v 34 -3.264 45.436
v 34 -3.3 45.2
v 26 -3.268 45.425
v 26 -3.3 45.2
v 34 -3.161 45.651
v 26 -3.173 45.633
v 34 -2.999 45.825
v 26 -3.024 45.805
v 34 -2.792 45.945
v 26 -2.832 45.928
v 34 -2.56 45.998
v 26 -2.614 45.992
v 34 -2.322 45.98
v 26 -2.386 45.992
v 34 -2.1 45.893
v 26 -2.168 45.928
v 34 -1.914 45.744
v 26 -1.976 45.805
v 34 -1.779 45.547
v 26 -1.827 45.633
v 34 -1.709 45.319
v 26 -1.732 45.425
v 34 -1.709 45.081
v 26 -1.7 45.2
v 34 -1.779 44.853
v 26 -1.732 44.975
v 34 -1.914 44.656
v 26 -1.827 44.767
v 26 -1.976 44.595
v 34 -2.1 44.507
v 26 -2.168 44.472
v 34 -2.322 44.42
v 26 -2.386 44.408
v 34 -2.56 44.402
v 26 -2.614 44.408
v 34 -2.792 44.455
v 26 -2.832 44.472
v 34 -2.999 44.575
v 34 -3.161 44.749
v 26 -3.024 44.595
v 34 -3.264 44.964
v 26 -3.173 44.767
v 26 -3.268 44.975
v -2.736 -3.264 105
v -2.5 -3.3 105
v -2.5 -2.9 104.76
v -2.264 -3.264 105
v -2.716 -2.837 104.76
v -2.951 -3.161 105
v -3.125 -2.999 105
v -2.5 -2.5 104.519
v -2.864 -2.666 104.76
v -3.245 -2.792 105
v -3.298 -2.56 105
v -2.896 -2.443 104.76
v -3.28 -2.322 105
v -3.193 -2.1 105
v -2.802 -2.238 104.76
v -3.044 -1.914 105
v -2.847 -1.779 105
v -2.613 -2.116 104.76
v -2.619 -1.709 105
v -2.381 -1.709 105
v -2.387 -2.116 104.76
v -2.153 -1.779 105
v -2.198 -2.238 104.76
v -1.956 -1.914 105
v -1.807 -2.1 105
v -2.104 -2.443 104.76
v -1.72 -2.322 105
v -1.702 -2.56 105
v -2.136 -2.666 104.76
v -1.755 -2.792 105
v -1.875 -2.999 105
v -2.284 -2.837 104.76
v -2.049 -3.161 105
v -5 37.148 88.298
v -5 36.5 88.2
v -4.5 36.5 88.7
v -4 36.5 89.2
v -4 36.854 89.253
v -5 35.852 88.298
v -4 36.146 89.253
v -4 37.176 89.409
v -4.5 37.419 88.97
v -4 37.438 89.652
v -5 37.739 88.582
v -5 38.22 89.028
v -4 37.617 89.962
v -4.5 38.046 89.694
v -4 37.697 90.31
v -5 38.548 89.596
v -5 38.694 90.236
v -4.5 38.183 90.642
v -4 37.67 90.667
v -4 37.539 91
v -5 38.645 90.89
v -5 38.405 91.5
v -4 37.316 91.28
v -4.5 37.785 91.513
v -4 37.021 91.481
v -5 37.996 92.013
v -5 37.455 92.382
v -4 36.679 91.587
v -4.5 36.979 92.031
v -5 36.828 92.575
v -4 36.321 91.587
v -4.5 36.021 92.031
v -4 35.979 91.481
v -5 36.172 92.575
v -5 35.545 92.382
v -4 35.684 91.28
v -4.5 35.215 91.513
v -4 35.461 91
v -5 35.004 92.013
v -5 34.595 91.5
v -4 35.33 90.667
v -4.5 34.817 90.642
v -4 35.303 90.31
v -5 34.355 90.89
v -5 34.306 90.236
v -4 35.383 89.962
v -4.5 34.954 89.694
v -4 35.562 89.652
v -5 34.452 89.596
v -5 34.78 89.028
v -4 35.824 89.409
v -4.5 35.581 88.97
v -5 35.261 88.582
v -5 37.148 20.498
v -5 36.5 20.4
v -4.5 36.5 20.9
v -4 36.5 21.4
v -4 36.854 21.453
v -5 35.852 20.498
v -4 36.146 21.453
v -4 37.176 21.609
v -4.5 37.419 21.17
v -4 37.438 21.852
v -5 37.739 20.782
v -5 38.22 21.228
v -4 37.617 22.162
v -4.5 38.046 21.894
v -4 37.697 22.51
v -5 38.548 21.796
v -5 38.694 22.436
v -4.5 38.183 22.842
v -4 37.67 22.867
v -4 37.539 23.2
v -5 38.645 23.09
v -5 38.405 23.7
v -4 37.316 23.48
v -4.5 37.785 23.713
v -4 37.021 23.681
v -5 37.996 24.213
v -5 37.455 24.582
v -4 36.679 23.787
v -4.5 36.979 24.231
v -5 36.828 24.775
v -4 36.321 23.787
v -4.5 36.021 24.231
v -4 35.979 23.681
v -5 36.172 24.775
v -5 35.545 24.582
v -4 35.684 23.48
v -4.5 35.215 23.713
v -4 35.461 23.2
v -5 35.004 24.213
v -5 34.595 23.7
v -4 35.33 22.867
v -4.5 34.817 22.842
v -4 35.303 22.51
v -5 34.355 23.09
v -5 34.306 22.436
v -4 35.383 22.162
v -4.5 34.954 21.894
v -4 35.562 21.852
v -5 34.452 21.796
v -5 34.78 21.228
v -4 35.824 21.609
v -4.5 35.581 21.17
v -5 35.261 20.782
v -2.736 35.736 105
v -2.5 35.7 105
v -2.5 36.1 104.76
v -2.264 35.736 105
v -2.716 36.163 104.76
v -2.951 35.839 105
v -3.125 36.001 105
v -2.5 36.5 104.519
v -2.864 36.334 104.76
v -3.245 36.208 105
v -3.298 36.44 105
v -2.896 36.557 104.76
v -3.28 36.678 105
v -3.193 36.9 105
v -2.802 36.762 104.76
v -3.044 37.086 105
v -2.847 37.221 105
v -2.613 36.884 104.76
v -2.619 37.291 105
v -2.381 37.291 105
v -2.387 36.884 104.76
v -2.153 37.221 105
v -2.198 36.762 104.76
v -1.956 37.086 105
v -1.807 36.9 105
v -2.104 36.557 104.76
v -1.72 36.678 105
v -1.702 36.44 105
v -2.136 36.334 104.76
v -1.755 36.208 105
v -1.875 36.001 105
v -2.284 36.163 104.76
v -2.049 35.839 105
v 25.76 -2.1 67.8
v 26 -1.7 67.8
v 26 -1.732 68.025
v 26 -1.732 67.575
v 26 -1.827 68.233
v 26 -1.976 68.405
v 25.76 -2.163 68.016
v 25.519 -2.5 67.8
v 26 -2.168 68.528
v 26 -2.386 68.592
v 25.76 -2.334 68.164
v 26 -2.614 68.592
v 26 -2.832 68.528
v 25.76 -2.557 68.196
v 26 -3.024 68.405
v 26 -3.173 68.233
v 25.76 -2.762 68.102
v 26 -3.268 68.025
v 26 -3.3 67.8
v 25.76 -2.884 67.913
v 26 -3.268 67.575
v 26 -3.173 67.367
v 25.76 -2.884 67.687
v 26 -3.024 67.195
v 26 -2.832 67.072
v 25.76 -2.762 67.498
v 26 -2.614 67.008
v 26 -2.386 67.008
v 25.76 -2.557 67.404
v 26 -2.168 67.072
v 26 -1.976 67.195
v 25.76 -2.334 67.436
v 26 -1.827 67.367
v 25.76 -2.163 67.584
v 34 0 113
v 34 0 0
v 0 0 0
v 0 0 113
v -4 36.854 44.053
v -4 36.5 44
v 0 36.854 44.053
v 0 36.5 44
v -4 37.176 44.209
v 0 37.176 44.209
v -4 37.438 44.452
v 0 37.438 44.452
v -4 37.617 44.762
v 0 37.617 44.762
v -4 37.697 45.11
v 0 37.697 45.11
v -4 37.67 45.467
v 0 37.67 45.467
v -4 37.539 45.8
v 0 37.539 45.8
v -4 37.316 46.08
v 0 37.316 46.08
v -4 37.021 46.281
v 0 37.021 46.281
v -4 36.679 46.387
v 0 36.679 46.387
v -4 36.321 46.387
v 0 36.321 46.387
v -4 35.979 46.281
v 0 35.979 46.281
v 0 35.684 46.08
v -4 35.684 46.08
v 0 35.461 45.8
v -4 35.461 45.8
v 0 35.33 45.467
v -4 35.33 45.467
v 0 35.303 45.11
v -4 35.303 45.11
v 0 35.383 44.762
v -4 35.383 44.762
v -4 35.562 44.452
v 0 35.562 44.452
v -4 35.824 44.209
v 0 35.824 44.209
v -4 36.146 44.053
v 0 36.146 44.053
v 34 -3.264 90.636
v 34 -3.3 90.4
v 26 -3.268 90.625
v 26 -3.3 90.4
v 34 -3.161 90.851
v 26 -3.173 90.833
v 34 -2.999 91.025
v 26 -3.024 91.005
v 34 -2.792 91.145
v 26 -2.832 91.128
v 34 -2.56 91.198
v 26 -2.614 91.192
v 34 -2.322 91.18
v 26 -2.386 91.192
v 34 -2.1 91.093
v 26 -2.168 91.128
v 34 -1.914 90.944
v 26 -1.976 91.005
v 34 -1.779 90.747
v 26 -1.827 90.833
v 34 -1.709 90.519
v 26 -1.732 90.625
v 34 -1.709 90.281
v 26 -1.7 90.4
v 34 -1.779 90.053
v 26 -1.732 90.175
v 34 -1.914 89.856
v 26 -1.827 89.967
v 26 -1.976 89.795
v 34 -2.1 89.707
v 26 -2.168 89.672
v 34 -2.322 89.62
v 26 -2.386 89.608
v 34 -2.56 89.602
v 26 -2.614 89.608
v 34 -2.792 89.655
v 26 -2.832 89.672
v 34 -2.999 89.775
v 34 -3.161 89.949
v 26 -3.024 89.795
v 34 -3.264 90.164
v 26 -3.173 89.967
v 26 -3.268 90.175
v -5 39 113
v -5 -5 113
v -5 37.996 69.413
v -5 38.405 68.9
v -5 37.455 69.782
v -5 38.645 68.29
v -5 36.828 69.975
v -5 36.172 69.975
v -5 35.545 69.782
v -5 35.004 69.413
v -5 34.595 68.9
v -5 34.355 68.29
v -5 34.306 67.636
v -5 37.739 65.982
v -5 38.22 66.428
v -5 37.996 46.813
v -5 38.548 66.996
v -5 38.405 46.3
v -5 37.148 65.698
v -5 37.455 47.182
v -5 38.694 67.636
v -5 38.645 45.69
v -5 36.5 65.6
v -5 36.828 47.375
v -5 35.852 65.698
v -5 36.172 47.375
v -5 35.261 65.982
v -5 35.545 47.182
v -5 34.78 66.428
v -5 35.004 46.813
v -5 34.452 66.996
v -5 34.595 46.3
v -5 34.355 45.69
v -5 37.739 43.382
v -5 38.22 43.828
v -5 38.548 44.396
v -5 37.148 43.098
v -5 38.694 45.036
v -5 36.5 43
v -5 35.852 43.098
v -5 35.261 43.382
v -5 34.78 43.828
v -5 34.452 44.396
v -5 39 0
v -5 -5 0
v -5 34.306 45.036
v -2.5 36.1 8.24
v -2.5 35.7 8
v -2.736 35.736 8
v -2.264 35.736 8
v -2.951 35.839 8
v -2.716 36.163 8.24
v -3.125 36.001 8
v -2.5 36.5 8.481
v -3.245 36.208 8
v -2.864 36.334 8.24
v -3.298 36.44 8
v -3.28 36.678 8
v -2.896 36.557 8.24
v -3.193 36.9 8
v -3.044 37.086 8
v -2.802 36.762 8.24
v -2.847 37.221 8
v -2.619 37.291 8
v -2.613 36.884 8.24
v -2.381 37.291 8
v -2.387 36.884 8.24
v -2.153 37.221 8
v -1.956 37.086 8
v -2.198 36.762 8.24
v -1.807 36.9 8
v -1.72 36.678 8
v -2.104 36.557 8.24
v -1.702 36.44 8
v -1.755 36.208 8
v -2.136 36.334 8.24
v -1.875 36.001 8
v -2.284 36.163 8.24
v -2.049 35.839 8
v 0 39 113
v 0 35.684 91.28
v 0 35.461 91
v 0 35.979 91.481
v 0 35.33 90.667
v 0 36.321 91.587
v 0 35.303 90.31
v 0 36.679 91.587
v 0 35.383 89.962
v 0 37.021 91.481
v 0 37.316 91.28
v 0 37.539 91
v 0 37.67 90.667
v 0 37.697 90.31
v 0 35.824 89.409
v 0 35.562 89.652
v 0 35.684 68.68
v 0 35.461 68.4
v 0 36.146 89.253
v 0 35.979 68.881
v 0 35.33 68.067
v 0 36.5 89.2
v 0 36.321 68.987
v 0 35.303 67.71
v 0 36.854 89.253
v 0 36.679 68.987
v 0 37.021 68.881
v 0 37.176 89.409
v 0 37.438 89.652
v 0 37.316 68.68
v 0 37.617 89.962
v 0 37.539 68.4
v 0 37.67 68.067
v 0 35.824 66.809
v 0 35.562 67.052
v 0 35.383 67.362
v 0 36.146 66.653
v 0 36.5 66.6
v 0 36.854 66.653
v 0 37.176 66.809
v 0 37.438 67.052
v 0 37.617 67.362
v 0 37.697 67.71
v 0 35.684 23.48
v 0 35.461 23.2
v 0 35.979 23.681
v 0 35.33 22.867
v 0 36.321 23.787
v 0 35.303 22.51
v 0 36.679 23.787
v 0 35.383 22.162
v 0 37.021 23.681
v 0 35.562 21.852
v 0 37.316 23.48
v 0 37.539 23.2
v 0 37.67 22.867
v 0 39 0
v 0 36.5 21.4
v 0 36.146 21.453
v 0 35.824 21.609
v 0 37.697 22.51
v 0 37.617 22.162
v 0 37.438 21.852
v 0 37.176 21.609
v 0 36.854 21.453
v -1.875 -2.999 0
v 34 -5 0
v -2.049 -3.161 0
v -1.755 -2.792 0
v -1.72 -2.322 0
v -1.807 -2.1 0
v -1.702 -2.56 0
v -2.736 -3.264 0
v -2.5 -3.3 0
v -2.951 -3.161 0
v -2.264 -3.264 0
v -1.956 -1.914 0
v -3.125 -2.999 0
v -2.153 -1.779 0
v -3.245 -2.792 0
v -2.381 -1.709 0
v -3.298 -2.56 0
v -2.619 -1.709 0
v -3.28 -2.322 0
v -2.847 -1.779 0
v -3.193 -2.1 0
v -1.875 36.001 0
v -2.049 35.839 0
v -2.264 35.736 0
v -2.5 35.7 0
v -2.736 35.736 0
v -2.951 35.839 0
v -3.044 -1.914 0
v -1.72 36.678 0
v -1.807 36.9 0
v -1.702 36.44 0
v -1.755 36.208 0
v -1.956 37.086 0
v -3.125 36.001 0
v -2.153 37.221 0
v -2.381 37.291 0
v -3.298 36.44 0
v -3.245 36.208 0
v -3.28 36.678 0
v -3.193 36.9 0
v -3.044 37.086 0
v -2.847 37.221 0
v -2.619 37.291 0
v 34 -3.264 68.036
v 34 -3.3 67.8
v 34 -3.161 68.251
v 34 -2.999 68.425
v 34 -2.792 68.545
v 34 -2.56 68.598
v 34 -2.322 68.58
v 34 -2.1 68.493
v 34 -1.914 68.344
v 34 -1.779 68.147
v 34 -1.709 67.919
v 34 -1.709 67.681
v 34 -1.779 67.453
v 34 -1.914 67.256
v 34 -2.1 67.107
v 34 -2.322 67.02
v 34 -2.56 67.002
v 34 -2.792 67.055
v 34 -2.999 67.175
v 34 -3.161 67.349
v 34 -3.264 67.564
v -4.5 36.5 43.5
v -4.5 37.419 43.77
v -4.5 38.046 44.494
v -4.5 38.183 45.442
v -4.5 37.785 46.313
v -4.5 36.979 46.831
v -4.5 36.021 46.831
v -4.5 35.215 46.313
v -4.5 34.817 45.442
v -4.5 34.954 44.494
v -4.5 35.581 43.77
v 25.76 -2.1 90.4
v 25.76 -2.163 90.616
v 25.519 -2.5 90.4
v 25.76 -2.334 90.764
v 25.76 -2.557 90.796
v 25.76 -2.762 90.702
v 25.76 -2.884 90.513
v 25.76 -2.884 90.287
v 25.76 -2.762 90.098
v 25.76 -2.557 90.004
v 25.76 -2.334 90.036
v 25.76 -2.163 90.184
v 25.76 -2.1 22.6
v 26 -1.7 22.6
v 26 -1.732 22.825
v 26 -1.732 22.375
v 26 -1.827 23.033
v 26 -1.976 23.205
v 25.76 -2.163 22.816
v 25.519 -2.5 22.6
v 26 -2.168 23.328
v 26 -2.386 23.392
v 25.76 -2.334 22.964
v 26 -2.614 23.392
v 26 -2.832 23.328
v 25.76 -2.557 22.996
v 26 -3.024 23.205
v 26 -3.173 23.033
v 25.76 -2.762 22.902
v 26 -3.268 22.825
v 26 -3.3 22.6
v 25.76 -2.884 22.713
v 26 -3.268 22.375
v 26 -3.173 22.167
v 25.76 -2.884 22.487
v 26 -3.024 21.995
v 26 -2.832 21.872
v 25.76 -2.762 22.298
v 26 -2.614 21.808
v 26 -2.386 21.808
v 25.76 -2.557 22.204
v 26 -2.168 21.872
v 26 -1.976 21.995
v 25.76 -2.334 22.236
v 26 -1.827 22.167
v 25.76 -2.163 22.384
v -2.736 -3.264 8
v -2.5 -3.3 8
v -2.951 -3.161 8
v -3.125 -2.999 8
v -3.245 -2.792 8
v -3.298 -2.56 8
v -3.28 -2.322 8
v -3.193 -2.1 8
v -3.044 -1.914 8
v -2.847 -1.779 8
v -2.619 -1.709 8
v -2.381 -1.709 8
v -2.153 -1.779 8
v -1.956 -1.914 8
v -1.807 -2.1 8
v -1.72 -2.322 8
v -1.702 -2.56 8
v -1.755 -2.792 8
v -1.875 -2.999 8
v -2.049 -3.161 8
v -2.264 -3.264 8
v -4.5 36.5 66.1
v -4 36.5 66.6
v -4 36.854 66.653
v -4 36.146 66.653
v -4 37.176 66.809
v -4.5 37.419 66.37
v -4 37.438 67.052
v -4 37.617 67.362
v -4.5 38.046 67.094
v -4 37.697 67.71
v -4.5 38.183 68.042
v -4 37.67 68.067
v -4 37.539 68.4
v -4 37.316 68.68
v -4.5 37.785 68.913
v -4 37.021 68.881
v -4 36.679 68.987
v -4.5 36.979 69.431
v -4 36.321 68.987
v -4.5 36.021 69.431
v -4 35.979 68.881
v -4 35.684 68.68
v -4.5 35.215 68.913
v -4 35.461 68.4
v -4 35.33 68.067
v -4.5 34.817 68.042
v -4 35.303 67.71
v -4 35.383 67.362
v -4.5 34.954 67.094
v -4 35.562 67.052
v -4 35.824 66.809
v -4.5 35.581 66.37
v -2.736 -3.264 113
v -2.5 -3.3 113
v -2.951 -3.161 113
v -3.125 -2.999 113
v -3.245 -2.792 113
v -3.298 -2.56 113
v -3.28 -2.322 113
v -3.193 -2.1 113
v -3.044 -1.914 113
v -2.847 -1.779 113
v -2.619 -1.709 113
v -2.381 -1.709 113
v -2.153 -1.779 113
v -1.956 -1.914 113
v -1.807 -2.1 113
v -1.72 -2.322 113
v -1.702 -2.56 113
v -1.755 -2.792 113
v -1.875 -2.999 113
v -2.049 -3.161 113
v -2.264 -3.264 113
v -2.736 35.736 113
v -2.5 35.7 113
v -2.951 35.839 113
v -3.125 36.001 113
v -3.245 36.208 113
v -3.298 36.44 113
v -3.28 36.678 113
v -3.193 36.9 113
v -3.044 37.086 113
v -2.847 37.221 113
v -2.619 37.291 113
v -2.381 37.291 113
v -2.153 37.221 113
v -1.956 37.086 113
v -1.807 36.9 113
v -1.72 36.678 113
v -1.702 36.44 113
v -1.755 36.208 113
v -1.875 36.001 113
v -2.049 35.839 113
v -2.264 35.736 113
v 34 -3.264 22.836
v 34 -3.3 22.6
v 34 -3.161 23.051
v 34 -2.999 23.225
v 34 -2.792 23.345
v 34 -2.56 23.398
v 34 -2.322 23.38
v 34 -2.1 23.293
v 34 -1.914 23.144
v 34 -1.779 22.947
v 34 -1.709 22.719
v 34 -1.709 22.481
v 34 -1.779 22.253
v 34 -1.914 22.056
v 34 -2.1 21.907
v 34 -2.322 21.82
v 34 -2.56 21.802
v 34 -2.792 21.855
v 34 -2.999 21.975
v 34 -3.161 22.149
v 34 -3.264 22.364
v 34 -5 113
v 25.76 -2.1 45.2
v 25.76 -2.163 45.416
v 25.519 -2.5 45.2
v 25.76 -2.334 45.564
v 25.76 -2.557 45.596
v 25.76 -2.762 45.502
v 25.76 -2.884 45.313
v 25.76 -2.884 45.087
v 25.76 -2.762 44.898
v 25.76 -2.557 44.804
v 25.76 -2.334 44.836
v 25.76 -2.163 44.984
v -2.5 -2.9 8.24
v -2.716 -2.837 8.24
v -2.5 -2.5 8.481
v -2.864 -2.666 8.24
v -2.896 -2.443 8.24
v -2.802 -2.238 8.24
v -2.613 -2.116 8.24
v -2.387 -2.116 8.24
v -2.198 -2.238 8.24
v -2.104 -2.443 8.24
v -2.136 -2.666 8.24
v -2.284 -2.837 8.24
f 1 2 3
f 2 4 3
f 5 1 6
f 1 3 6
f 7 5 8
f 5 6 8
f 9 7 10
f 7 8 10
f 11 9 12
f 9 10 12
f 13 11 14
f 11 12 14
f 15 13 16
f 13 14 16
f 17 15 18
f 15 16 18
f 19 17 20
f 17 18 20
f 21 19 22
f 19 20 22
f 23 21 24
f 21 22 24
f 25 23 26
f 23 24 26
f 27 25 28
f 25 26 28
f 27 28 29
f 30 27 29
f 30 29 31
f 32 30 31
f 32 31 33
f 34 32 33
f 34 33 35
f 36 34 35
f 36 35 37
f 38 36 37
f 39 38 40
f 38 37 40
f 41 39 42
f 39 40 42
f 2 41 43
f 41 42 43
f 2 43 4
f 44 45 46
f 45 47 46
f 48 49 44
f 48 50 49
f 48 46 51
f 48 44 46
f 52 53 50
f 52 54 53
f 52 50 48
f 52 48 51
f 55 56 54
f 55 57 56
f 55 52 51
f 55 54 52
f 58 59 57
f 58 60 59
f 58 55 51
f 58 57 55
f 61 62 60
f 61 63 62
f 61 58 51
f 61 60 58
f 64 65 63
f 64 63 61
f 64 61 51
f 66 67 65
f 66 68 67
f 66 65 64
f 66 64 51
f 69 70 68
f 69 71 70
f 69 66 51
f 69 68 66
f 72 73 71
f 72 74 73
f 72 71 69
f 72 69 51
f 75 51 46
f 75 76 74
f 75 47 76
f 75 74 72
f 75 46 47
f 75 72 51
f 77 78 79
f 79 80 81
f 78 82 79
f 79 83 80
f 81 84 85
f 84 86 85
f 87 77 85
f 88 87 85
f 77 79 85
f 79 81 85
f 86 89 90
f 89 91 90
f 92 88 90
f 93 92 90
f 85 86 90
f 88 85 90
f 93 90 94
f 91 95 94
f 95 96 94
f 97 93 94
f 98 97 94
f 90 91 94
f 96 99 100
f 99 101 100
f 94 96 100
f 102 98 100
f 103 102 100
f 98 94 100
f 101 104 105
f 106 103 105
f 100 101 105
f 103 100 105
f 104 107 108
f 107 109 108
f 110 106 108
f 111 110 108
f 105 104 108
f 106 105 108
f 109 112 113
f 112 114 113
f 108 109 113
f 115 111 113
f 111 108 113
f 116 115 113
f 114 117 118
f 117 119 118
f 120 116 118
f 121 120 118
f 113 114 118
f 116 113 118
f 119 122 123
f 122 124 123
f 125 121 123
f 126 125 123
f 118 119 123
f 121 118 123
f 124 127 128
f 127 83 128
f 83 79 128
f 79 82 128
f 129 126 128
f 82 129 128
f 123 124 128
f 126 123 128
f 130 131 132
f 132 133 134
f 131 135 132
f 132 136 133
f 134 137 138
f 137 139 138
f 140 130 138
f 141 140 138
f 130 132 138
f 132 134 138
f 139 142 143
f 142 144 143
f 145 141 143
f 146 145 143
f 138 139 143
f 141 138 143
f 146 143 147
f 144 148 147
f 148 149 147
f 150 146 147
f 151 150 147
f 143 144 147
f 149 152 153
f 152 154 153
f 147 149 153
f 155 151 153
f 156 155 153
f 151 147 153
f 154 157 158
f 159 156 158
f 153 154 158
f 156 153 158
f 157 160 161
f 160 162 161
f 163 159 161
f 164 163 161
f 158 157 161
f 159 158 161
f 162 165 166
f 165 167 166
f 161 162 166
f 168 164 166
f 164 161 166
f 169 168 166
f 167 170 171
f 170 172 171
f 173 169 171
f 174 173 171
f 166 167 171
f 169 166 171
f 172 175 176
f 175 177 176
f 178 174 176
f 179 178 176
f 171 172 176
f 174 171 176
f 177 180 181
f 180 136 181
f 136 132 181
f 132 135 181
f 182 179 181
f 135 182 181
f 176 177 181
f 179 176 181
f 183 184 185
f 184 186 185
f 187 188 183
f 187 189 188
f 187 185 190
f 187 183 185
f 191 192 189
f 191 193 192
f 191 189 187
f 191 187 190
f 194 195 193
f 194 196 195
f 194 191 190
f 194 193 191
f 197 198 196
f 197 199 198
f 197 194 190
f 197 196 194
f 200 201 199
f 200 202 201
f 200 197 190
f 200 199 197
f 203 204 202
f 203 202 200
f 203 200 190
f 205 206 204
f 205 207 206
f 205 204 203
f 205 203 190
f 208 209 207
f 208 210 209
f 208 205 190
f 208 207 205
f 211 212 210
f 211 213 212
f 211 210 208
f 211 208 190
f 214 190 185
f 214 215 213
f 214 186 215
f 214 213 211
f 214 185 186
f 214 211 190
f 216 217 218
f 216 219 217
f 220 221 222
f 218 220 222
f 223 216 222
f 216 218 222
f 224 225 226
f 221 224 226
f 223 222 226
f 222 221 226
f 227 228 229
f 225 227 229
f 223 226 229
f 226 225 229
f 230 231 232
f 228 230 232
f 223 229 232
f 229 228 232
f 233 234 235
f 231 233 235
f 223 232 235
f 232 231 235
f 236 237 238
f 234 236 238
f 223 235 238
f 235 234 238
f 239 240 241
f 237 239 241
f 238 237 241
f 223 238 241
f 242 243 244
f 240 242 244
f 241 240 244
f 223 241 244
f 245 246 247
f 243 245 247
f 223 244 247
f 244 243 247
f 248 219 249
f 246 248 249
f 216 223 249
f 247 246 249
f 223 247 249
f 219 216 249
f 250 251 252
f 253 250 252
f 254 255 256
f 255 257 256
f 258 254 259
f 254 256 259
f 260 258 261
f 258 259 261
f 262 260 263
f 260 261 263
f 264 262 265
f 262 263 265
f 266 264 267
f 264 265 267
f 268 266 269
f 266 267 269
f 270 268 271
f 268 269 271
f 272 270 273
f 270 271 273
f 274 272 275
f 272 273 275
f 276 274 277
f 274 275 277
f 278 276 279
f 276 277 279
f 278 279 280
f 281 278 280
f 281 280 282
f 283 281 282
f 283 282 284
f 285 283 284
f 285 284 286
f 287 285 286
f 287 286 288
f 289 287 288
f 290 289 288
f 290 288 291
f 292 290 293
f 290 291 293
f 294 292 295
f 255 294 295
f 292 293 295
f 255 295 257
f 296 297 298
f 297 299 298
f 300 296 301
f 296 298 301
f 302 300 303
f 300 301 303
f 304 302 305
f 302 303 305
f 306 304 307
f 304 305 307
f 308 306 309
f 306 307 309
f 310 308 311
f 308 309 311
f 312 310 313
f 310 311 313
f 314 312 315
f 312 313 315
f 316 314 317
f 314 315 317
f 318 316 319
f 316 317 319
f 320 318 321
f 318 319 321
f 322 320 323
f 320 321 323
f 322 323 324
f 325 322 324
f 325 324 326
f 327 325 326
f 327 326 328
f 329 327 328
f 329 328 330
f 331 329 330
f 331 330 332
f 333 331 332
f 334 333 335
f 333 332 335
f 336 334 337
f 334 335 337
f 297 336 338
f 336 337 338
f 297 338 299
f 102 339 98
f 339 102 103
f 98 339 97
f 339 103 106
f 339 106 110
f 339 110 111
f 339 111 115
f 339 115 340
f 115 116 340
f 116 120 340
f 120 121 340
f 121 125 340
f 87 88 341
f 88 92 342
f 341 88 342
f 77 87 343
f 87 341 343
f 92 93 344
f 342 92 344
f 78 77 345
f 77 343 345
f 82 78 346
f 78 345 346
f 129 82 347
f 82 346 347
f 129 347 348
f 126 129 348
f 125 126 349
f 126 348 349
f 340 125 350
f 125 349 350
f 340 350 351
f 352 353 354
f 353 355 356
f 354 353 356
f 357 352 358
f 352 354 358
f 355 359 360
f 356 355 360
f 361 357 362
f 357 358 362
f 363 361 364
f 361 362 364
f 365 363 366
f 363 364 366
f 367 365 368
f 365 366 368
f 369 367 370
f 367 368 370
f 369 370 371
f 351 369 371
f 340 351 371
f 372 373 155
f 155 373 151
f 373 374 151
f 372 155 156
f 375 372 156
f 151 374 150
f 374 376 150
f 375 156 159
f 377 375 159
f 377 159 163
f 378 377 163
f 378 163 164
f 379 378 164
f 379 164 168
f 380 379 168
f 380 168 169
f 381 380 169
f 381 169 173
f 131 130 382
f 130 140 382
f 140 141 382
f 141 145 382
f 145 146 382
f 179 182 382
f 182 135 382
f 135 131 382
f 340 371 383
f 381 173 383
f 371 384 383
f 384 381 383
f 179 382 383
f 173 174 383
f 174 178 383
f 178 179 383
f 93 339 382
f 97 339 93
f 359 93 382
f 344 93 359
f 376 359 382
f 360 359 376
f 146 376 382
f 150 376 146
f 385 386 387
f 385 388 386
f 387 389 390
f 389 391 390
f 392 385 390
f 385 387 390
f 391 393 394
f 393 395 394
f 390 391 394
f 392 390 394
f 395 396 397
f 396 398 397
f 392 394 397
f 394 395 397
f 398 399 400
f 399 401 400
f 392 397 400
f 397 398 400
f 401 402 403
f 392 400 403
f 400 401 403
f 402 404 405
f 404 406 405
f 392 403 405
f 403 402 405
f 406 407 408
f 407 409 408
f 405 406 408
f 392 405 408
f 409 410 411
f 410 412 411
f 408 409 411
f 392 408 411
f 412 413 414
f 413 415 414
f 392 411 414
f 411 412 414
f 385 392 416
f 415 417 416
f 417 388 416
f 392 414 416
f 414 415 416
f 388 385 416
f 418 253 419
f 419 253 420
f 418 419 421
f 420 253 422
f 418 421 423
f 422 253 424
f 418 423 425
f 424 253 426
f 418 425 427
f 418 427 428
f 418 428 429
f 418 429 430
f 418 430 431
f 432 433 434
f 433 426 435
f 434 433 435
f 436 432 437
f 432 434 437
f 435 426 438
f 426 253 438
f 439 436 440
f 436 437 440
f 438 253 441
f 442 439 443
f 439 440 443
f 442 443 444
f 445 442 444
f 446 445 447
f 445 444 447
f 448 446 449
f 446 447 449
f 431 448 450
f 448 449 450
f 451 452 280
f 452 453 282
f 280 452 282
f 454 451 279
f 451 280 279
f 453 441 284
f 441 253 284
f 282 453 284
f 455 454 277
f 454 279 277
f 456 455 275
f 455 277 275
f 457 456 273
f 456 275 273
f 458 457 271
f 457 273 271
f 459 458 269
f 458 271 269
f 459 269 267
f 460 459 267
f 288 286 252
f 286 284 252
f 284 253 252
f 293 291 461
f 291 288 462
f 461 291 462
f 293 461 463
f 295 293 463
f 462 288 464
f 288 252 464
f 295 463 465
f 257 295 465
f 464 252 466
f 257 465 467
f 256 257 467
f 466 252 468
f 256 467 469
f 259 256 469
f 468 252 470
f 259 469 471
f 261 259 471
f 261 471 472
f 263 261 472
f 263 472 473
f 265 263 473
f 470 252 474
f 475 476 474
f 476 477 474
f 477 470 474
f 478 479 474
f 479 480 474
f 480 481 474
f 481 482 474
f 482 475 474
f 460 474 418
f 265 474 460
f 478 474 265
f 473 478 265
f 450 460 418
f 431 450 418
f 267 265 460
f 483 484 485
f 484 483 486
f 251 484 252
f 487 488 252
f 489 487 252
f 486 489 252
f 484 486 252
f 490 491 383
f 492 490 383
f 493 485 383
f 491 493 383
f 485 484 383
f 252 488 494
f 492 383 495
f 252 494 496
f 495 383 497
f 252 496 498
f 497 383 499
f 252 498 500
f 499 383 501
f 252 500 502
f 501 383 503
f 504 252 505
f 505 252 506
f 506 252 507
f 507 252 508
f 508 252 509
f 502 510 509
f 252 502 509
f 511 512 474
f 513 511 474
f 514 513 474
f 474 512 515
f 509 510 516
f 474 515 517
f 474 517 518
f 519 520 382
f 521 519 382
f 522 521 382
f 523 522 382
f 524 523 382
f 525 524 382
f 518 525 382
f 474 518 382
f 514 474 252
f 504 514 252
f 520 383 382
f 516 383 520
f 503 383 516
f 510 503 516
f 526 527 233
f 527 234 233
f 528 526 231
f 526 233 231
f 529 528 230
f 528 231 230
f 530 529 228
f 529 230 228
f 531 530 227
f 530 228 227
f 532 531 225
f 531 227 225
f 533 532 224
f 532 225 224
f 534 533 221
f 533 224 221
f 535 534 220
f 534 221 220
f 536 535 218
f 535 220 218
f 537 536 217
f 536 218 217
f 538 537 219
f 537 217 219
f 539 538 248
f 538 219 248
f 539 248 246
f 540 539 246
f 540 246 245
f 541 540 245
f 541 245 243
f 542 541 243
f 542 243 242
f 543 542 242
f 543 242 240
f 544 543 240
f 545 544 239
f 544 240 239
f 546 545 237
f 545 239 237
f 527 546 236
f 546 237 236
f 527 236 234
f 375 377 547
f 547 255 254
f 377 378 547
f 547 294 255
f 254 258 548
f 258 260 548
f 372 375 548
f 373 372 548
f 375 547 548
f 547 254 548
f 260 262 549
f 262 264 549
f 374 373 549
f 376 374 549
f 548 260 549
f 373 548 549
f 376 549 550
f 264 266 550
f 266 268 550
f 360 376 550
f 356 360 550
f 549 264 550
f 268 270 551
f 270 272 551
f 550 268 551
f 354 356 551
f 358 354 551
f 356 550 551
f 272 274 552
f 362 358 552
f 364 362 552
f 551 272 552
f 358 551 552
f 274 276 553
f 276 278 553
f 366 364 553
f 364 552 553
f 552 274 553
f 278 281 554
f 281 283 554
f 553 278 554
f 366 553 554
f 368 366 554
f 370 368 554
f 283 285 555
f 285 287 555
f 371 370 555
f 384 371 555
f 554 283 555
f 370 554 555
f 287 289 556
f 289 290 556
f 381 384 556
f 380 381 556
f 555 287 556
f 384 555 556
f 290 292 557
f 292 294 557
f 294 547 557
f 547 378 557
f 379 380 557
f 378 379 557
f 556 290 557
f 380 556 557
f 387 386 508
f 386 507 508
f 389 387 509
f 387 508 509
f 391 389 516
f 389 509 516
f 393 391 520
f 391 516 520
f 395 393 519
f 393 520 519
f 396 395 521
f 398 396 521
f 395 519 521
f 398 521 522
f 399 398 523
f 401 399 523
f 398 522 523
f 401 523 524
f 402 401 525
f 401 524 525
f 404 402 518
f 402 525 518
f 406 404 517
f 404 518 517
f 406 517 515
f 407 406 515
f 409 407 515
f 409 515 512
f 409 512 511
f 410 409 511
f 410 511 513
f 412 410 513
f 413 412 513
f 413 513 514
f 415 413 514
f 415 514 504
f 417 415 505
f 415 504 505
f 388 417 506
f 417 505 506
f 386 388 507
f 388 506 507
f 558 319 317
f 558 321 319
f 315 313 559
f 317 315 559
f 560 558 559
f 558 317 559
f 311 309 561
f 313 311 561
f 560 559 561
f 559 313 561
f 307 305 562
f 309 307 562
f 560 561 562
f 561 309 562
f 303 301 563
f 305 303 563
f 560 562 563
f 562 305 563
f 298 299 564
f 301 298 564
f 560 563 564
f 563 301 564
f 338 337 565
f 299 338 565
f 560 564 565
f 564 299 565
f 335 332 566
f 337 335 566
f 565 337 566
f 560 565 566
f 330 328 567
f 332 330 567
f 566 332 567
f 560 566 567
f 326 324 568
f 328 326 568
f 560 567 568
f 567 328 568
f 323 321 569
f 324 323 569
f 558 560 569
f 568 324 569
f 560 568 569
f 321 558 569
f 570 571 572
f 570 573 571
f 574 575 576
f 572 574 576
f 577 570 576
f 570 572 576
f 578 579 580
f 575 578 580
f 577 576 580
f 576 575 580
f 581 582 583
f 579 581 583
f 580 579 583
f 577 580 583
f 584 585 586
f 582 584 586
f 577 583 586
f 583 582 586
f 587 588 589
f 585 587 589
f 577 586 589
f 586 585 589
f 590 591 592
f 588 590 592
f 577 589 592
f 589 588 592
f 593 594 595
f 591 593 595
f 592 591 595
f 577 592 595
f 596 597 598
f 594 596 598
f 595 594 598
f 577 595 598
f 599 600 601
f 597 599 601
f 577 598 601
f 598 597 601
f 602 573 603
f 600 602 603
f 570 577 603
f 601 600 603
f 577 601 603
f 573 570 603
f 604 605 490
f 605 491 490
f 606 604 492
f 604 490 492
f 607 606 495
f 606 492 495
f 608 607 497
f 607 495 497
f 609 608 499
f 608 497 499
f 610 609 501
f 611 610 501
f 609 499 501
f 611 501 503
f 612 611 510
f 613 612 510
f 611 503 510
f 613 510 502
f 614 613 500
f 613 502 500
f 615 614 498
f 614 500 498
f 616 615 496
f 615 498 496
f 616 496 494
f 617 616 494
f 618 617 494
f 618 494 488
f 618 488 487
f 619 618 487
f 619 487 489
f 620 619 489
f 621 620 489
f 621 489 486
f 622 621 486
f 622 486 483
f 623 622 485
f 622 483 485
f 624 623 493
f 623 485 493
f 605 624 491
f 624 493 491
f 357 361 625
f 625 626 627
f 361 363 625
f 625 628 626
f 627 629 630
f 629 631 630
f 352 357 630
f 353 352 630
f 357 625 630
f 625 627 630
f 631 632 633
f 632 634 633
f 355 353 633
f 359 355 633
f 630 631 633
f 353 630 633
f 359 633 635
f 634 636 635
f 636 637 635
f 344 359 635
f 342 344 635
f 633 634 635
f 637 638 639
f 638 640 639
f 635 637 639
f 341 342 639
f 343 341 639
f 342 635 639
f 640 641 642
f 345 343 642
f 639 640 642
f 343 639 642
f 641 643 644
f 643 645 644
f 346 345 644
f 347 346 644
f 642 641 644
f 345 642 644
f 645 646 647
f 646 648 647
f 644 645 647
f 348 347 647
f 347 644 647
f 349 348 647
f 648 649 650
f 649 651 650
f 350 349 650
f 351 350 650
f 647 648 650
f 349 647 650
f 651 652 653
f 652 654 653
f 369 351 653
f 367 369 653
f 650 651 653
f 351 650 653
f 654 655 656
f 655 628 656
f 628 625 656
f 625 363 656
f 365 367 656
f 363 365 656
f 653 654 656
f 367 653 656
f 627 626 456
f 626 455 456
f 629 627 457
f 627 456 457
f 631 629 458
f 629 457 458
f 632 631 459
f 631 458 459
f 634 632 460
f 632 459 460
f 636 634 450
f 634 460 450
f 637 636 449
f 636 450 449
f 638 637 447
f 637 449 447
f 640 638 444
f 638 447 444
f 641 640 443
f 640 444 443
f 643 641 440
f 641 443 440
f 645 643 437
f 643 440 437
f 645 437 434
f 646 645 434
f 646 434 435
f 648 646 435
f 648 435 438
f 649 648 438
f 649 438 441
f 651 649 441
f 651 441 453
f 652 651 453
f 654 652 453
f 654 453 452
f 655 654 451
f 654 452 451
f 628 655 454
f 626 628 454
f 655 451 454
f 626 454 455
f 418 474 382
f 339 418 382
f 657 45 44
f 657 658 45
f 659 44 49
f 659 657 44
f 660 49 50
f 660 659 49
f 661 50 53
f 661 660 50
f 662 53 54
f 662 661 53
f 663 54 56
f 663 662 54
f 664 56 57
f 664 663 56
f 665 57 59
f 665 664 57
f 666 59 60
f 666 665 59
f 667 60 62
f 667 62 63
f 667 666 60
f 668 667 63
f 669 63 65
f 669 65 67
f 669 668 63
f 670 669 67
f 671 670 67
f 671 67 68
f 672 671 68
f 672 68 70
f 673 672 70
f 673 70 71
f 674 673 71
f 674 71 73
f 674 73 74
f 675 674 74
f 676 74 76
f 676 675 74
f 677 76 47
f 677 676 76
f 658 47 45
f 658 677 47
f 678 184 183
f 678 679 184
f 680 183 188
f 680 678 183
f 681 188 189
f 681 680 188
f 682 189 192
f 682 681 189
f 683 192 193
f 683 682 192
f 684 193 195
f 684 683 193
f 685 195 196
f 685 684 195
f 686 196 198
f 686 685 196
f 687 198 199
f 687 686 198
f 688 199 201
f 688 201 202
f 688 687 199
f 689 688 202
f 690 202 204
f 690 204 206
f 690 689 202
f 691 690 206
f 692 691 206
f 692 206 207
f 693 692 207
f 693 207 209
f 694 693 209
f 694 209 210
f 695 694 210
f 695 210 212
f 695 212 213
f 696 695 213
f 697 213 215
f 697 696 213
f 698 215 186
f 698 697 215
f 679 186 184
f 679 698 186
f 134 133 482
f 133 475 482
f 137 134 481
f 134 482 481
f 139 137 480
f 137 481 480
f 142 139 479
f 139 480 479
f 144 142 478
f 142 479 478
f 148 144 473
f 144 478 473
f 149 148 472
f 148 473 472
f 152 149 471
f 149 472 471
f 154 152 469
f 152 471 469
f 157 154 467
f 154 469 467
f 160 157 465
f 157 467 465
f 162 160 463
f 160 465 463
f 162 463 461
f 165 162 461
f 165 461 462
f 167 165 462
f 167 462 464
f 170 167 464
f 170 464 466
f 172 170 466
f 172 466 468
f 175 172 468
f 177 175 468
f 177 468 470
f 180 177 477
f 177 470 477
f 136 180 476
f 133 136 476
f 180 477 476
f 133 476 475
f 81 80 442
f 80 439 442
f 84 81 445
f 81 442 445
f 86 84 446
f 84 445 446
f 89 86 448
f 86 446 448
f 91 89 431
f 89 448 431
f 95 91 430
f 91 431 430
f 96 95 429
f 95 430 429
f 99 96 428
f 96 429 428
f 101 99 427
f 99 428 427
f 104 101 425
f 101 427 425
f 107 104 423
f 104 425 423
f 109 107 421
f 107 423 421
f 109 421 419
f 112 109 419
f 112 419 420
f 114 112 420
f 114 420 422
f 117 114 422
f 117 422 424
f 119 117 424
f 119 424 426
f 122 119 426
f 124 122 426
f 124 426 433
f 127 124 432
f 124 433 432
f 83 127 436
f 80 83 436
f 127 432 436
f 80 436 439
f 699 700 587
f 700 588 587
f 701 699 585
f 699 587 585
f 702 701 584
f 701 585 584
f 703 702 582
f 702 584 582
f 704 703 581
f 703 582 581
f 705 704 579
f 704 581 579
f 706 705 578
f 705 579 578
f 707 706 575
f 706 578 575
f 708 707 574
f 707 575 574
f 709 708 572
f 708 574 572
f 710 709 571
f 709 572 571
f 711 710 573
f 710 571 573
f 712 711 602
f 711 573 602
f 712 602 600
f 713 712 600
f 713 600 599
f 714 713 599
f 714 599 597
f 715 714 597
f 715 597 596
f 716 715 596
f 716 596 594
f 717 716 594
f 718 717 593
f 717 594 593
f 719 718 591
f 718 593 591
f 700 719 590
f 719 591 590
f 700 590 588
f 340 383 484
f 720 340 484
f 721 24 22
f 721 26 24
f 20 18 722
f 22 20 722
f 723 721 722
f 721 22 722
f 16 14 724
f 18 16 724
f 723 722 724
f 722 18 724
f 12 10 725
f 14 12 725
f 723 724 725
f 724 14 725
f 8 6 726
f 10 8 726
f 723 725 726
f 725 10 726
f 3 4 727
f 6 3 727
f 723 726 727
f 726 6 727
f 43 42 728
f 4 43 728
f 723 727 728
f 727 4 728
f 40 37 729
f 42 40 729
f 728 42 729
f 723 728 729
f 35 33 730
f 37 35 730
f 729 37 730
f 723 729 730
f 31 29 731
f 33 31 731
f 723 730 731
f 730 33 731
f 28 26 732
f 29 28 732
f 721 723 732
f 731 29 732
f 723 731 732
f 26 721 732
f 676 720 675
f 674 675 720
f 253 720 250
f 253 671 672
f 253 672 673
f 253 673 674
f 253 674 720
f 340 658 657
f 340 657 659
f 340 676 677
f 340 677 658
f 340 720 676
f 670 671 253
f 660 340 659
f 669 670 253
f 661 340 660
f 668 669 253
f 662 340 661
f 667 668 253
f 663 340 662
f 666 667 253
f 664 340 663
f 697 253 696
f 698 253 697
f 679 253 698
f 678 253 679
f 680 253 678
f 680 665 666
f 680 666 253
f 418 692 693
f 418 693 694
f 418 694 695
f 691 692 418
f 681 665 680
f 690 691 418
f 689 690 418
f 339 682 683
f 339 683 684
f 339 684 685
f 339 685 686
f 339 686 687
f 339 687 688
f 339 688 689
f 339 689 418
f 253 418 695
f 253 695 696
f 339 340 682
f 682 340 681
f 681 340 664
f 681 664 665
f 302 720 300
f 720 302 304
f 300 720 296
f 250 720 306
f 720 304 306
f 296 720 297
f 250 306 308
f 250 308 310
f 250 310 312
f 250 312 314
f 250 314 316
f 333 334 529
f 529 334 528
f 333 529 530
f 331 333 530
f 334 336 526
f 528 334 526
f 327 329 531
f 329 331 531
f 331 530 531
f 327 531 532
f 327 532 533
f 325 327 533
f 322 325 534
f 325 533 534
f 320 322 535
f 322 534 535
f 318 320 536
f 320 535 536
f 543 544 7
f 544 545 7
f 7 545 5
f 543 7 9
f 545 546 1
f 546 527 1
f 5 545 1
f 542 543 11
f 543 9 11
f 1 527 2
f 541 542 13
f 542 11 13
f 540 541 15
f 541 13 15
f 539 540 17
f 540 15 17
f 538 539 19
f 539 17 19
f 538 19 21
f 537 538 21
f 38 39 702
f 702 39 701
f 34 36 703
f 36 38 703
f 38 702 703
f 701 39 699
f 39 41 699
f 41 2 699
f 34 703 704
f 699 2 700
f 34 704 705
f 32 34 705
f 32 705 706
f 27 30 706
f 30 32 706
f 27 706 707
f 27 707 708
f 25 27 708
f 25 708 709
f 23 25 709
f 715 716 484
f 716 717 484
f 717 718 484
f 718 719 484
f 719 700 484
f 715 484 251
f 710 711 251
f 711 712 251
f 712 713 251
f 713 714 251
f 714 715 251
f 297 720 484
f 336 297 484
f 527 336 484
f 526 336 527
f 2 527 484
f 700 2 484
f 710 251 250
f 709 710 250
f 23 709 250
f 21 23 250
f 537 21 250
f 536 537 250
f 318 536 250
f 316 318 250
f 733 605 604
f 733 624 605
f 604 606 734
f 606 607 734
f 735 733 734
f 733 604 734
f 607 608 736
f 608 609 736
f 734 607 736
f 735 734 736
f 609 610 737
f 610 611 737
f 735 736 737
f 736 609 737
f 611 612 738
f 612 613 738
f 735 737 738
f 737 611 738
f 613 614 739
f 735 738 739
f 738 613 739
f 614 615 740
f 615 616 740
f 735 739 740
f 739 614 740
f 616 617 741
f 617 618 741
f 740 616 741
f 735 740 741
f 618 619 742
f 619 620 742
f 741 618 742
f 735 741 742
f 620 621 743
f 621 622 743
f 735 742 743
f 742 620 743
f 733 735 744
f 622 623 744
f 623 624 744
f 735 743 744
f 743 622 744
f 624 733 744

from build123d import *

# Parameters (mm, degrees)
BOSS_EXTRUDE_EQUERRE_DEPTH                     = 113
FRAISAGE_POUR_VIS_T_TE_FRAIS_E_M20_D           = 2.4
FRAISAGE_POUR_VIS_T_TE_FRAIS_E_M20_DEPTH       = 5
FRAISAGE_POUR_VIS_T_TE_FRAIS_E_M20_CSINK_D     = 4.4
FRAISAGE_POUR_VIS_T_TE_FRAIS_E_M20_CSINK_ANGLE = 90
FRAISAGE_POUR_VIS_T_TE_FRAIS_E_M20_TIP         = 0.721032743
TROU_TARAUD_M2X0_43_D                          = 1.6
TROU_TARAUD_M2X0_43_DEPTH                      = 8
TROU_TARAUD_M2X0_43_TIP                        = 0.480688495
TROU_TARAUD_M2X0_44_AT_2_COUNT                 = 2
TROU_TARAUD_M2X0_44_AT_2_PITCH                 = 39


with BuildPart() as part:
    # Esquisse1 → Boss_Extrude_Equerre (new body)
    with BuildSketch(Plane(origin=(0, 0, 0), x_dir=(0, 1, 0), z_dir=(0, 0, 1))):
        Polygon((0, 0), (39, 0), (39, 5), (-5, 5), (-5, 0), (-5, -34), (0, -34), align=None)
    extrude(amount=BOSS_EXTRUDE_EQUERRE_DEPTH)

    # Fraisage pour vis à tête fraisée M20
    with Locations(Plane.ZY.offset(5)):
        with Locations((67.8, 36.5), (90.4, 36.5), (45.2, 36.5), (22.6, 36.5)):
            CounterSinkHole(FRAISAGE_POUR_VIS_T_TE_FRAIS_E_M20_D / 2, FRAISAGE_POUR_VIS_T_TE_FRAIS_E_M20_CSINK_D / 2, depth=FRAISAGE_POUR_VIS_T_TE_FRAIS_E_M20_DEPTH, counter_sink_angle=FRAISAGE_POUR_VIS_T_TE_FRAIS_E_M20_CSINK_ANGLE)
            with Locations((0, 0, -(FRAISAGE_POUR_VIS_T_TE_FRAIS_E_M20_DEPTH + FRAISAGE_POUR_VIS_T_TE_FRAIS_E_M20_TIP / 2))):  # 118° drill point
                Cone(0, FRAISAGE_POUR_VIS_T_TE_FRAIS_E_M20_D / 2, FRAISAGE_POUR_VIS_T_TE_FRAIS_E_M20_TIP, mode=Mode.SUBTRACT)

    # Trou taraudé M2x0.43
    with Locations(Plane.YZ.offset(34)):
        with Locations((-2.5, 67.8), (-2.5, 90.4), (-2.5, 45.2), (-2.5, 22.6)):
            Hole(TROU_TARAUD_M2X0_43_D / 2, depth=TROU_TARAUD_M2X0_43_DEPTH)
            with Locations((0, 0, -(TROU_TARAUD_M2X0_43_DEPTH + TROU_TARAUD_M2X0_43_TIP / 2))):  # 118° drill point
                Cone(0, TROU_TARAUD_M2X0_43_D / 2, TROU_TARAUD_M2X0_43_TIP, mode=Mode.SUBTRACT)

    # Esquisse11 → Trou taraudé M2x0.44 (revolve, cut)
    with BuildSketch(Plane(origin=(-2.5, 36.5, 113), x_dir=(0, -1, 0), z_dir=(1, 0, 0))):
        Polygon((0, 0), (0, 8.480688495), (0.8, 8), (0.8, 0), align=None)
    trou_taraud_m2x0_44 = revolve(axis=Axis((-2.5, 36.5, 119.35), (0, 0, -1)), mode=Mode.SUBTRACT)

    # Trou taraudé M2x0.44 at 2: Trou taraudé M2x0.44 ×2
    with Locations(*[(0, -i * TROU_TARAUD_M2X0_44_AT_2_PITCH, 0) for i in range(1, TROU_TARAUD_M2X0_44_AT_2_COUNT)]):
        add(trou_taraud_m2x0_44, mode=Mode.SUBTRACT)

    # Symétrie1: Trou taraudé M2x0.44 across plane
    add(trou_taraud_m2x0_44.mirror(Plane.XY.offset(56.5)), mode=Mode.SUBTRACT)

    # Symétrie1 copy 1 sketch → Symétrie1 copy 1 (revolve, cut)
    with BuildSketch(Plane(origin=(-2.5, -2.5, 0), x_dir=(0, -1, 0), z_dir=(1, 0, 0))):
        Polygon((0, 0), (0, -8.480688495), (0.8, -8), (0.8, 0), align=None)
    revolve(axis=Axis((-2.5, -2.5, -6.35), (0, 0, -1)), mode=Mode.SUBTRACT)


solid = part.part
